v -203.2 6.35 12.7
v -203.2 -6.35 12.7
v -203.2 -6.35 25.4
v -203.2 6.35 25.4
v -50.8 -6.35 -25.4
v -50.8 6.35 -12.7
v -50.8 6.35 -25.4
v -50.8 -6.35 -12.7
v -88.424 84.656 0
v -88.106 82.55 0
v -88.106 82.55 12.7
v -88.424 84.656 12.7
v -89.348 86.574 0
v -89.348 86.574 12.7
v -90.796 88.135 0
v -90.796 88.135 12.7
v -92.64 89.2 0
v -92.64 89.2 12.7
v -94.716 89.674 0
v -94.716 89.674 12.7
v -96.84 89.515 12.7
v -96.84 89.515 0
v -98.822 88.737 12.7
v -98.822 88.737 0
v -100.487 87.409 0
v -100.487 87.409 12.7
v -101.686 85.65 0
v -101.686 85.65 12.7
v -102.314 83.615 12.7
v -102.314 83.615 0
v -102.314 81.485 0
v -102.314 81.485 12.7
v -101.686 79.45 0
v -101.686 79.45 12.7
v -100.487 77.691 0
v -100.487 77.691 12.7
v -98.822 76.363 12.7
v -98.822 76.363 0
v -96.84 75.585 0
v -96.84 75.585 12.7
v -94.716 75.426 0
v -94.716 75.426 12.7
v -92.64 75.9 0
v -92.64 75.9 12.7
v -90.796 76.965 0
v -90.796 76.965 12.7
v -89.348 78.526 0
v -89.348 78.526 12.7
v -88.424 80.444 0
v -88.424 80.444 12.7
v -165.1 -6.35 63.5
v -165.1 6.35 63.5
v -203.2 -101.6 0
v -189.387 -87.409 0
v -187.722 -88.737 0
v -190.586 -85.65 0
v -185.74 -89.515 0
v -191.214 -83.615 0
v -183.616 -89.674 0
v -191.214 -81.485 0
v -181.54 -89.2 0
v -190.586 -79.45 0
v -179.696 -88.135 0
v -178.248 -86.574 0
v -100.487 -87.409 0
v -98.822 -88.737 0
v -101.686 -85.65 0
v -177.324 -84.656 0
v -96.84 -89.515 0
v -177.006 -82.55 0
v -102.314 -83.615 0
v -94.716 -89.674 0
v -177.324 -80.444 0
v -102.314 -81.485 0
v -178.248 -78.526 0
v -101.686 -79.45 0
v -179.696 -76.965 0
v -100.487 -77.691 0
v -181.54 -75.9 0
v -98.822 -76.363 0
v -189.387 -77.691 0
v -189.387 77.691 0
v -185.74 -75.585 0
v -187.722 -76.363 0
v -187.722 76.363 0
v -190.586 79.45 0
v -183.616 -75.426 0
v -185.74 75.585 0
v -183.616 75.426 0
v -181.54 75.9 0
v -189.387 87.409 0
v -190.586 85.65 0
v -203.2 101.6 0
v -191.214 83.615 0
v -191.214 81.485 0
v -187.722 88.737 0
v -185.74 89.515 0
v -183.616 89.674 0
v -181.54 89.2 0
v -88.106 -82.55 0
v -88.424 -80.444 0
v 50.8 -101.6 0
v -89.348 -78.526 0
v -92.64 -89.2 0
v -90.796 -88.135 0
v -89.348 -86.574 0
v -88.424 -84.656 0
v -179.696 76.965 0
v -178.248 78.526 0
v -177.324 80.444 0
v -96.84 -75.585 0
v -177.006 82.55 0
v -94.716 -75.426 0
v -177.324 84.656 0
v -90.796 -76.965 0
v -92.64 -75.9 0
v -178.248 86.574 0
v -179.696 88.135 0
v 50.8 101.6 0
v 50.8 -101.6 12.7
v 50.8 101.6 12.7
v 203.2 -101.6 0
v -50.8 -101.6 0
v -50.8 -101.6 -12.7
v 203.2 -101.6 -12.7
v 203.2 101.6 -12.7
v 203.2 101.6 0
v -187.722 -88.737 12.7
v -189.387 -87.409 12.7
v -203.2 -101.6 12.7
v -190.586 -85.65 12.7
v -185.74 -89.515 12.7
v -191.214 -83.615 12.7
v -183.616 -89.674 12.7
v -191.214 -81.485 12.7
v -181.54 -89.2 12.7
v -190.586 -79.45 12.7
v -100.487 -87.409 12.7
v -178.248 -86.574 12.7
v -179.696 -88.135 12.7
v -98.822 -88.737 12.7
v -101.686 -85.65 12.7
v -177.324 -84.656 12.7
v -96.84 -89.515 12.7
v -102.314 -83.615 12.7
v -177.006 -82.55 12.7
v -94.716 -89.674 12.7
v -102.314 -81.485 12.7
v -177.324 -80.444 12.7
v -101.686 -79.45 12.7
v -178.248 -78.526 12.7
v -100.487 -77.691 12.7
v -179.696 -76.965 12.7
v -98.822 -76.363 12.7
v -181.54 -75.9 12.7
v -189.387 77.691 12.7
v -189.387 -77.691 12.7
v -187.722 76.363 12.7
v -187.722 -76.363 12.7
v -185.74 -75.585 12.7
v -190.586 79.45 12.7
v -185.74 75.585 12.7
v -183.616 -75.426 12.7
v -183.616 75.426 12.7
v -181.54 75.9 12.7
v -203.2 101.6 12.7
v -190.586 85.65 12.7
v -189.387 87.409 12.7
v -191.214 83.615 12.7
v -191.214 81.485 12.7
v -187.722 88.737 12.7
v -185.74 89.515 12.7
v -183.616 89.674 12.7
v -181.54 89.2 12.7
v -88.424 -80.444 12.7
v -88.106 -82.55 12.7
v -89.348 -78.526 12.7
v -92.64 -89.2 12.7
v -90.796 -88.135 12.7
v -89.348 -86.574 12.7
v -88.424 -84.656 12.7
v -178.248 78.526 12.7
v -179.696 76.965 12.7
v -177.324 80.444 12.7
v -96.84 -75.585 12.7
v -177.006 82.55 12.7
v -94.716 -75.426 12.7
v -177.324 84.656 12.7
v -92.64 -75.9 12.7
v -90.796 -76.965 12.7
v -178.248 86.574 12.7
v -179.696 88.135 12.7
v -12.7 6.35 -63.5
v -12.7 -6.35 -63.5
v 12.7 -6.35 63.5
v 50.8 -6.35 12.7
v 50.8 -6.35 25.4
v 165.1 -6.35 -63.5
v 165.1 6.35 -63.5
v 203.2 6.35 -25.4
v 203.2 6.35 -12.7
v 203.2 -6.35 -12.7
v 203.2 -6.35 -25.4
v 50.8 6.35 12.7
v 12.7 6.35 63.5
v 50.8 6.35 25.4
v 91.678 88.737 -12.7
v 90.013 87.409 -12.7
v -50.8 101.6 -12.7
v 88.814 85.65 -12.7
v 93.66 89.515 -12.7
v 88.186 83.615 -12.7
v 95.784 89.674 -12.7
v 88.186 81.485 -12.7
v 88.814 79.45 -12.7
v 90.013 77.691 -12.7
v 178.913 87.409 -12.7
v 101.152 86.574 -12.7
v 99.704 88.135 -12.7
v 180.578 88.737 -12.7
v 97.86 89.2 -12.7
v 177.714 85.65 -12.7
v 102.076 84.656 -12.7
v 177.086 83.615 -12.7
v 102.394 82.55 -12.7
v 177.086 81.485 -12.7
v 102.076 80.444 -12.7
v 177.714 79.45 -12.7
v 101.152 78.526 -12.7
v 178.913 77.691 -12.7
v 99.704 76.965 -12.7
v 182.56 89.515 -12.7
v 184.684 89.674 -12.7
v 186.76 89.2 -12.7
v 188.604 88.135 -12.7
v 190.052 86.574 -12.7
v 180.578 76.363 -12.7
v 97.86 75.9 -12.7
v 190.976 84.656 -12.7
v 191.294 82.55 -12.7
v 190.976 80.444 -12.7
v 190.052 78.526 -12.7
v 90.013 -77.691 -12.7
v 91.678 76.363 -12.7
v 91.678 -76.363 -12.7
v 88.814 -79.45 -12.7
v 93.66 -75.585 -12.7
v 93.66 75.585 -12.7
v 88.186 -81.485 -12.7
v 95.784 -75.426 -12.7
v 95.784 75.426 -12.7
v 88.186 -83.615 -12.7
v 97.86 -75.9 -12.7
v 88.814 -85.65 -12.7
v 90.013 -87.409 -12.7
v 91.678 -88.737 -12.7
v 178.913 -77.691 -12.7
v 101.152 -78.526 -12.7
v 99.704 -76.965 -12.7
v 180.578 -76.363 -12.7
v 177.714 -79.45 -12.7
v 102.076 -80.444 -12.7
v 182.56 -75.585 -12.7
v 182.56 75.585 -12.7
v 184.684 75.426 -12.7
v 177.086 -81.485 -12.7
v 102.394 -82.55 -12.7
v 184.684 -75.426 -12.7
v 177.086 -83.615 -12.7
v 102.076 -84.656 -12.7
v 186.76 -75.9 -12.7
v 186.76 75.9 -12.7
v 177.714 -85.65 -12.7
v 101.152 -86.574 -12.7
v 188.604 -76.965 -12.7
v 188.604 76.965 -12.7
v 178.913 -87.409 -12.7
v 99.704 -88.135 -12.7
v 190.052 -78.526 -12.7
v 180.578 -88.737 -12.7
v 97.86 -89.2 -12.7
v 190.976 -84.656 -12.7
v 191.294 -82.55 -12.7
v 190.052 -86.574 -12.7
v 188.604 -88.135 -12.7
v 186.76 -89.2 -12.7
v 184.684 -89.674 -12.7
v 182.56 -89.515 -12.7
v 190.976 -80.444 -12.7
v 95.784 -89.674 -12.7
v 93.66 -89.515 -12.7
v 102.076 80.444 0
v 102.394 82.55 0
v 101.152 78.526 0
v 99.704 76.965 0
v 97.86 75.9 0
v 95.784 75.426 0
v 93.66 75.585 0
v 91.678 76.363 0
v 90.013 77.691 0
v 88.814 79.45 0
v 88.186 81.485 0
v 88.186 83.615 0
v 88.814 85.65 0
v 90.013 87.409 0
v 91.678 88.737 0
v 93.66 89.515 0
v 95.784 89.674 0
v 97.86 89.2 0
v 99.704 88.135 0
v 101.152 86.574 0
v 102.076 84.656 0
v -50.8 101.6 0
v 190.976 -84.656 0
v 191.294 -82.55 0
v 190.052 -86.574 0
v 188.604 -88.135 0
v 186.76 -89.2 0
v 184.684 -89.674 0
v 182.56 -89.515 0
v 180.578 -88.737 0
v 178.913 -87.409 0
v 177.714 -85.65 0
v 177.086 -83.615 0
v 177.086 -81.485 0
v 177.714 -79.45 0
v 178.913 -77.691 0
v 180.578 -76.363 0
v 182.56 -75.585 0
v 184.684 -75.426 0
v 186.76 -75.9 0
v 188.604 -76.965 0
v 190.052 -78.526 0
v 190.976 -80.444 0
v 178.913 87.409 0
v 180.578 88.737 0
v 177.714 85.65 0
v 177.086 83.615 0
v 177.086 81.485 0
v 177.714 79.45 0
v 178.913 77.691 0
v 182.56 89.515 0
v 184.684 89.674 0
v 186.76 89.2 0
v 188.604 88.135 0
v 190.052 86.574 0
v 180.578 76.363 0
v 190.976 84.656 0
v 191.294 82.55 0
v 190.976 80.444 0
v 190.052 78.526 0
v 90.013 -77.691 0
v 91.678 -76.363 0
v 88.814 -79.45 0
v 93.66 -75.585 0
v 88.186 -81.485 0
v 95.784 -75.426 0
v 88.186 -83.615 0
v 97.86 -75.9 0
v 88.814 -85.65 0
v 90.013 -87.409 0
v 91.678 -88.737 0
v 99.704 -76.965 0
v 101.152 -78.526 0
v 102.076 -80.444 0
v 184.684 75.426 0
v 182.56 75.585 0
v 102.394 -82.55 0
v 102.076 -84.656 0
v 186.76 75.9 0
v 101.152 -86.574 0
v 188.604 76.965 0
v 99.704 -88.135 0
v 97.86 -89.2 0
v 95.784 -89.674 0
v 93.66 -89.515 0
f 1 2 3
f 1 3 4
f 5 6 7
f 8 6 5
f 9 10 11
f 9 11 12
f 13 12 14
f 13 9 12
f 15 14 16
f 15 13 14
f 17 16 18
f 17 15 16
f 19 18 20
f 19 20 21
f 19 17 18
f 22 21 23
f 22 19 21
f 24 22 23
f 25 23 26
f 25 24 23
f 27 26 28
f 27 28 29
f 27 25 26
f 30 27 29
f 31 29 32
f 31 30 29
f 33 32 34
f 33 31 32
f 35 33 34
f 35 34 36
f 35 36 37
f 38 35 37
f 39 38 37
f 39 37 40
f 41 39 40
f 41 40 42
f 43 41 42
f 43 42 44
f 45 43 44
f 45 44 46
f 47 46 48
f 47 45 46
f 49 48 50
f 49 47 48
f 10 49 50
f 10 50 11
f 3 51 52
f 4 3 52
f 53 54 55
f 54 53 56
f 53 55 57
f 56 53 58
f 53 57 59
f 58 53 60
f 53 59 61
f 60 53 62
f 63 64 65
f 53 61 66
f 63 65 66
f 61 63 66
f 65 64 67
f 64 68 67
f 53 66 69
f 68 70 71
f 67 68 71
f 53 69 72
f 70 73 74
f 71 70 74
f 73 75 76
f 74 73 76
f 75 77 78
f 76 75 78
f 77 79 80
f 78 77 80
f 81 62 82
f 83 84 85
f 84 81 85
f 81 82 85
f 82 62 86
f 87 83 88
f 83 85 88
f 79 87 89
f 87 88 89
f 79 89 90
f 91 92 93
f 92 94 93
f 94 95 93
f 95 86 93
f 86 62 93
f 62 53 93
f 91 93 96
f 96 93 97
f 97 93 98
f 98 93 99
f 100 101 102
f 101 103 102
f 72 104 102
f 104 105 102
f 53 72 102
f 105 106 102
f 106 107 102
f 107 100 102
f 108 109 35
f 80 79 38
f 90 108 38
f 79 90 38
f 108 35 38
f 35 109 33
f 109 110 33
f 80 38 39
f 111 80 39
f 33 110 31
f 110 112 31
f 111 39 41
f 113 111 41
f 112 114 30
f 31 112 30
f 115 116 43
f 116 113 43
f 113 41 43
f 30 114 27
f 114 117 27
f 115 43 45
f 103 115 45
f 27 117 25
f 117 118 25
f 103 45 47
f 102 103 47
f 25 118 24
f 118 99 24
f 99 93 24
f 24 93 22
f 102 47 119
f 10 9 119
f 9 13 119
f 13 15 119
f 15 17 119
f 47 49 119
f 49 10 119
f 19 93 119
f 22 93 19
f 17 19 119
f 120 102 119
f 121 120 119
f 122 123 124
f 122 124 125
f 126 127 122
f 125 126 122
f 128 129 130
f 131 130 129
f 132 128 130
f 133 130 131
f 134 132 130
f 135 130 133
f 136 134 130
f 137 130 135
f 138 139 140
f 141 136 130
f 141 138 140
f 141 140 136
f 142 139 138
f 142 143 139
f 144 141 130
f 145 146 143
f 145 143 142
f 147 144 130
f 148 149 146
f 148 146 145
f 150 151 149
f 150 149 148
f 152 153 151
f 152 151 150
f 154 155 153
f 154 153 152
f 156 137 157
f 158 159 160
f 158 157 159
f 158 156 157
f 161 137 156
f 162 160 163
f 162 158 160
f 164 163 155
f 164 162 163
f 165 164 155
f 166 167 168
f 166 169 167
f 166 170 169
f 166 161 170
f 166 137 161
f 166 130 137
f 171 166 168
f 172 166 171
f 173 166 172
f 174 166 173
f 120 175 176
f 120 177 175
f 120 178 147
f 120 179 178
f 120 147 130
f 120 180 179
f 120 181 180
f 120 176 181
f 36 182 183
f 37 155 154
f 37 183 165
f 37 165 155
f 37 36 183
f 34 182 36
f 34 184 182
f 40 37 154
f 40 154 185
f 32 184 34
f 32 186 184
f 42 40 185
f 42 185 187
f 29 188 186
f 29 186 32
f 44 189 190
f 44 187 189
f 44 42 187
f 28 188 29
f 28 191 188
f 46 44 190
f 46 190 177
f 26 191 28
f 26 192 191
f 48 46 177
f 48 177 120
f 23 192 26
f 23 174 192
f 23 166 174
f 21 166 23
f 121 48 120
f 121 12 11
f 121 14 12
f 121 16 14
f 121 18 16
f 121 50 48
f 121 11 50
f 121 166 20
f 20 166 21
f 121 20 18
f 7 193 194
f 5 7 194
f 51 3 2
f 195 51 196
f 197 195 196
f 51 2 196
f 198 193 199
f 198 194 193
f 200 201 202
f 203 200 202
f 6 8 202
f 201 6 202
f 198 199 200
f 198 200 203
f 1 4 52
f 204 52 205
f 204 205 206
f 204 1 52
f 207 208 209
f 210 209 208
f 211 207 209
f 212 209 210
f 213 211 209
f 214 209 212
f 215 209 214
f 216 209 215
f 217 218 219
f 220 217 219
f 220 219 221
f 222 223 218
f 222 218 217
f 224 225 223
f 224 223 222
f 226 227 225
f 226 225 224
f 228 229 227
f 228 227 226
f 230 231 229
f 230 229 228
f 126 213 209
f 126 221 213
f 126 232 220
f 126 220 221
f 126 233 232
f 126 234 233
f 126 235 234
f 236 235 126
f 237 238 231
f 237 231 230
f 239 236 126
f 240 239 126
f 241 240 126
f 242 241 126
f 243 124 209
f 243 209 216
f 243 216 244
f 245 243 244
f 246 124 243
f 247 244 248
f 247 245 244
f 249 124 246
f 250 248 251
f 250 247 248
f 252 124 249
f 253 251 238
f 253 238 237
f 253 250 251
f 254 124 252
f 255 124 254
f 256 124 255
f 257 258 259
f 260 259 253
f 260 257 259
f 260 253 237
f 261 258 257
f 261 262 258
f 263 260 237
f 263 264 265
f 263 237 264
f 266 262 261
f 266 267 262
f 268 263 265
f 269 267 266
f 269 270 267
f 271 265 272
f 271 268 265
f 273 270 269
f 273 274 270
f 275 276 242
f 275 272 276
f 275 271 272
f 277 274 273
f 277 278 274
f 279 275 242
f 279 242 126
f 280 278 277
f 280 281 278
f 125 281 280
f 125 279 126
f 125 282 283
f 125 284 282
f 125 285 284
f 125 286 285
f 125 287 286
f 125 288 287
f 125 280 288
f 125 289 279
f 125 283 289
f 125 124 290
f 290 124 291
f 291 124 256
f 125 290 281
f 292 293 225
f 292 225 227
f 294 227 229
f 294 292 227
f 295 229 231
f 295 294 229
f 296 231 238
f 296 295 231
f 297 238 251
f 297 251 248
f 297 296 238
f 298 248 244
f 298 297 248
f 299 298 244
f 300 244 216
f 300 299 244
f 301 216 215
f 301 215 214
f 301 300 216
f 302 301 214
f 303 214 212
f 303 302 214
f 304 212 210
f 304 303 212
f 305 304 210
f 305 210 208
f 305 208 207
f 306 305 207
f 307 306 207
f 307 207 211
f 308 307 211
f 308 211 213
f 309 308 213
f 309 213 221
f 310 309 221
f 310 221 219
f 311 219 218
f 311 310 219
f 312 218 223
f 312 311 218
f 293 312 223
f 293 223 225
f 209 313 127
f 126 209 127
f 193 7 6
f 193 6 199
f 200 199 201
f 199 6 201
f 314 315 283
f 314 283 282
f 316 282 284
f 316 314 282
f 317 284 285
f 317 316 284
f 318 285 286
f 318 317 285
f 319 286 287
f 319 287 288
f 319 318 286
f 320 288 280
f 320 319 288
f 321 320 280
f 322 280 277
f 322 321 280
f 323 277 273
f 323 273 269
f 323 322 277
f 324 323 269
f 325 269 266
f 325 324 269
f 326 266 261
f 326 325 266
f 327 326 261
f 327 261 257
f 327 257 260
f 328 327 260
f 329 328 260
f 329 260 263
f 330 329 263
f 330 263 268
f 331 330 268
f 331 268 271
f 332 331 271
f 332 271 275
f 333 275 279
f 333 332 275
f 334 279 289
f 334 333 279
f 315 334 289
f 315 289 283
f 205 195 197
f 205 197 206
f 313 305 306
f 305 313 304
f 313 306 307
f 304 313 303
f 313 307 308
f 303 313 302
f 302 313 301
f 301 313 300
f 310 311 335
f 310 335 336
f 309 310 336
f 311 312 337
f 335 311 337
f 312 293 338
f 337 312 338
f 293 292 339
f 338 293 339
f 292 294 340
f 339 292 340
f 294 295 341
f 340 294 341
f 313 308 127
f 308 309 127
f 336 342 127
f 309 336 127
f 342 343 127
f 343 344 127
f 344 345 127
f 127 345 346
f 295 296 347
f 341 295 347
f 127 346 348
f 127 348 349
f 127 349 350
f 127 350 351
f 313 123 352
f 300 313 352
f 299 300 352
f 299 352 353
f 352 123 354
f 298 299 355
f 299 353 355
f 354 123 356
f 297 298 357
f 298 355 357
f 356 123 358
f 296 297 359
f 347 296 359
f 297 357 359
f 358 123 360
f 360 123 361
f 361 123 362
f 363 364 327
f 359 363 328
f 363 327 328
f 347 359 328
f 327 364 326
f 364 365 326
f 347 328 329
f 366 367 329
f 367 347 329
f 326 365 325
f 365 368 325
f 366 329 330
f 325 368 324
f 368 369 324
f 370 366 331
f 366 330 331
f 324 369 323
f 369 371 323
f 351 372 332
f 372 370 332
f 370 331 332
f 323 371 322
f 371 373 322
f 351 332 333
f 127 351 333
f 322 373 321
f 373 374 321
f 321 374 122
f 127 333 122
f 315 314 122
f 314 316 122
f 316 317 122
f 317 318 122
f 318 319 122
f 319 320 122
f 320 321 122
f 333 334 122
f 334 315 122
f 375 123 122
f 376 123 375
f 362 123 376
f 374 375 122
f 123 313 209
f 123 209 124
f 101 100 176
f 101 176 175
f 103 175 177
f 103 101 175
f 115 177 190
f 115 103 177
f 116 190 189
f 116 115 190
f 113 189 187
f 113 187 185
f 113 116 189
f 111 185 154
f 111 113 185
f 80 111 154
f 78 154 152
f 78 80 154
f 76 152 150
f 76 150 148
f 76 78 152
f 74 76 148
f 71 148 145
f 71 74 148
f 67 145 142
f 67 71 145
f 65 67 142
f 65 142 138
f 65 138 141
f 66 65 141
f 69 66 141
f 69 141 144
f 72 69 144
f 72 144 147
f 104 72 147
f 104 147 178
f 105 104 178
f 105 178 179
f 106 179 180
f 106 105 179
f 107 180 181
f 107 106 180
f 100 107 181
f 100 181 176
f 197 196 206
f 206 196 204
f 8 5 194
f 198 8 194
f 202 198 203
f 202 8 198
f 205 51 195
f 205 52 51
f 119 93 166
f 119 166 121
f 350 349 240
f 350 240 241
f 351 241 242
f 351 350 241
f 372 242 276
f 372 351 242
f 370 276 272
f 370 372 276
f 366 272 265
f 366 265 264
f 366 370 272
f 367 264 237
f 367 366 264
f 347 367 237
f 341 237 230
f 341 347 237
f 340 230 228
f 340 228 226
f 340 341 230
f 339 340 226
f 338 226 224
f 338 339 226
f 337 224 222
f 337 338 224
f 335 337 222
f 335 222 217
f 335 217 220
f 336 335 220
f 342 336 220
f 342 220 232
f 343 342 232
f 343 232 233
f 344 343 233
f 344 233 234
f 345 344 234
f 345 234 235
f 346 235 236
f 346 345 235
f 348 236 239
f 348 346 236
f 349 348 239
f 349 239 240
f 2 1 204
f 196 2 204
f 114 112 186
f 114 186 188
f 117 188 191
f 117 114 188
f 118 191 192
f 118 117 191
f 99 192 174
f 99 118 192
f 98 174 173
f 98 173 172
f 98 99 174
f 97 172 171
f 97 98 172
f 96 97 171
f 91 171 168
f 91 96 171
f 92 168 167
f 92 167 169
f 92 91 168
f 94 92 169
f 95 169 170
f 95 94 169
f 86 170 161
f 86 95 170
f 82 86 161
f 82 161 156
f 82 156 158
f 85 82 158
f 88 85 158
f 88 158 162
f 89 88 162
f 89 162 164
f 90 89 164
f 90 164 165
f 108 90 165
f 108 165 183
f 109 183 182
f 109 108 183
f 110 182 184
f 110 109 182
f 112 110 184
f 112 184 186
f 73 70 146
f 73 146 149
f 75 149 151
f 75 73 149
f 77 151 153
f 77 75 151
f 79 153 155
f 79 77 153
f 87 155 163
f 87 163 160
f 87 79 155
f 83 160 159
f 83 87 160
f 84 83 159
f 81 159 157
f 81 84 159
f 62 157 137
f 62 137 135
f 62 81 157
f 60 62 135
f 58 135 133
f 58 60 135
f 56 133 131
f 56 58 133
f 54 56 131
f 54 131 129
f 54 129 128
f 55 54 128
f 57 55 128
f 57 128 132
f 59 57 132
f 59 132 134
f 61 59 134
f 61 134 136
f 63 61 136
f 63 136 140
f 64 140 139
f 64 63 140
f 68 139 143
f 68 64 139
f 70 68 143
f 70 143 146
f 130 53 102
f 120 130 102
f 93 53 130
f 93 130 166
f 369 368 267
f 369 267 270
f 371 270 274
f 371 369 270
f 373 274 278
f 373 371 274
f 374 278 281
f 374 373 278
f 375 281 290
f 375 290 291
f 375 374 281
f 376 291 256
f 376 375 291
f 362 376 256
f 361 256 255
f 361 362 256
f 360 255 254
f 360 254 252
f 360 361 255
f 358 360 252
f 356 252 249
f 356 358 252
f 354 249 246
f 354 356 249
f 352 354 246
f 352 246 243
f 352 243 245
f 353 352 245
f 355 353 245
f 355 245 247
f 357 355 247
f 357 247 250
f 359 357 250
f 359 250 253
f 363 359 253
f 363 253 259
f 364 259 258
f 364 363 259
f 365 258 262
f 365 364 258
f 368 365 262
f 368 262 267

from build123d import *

# Parameters (mm, degrees)
F0_W     = 254
F0_H     = 203.2
F0_R     = 7.14375
F1_DEPTH = 12.7
F2_W     = 254
F2_H     = 203.2
F2_R     = 7.14375
F3_DEPTH = 12.7
F4_W     = 254
F4_H     = 12.7
F5_DEPTH = 50.8
F6_SIZE  = 38.1
F7_W     = 254
F7_H     = 12.7
F8_DEPTH = 50.8
F9_SIZE  = 38.1


with BuildPart() as f1:
    # F0 (on Top) → F1 (new body)
    with BuildSketch(Plane.XY):
        with Locations((-76.2, 0)):
            Rectangle(F0_W, F0_H)
        with Locations((-184.15, -82.55)):
            Circle(F0_R, mode=Mode.SUBTRACT)
        with Locations((-95.25, -82.55)):
            Circle(F0_R, mode=Mode.SUBTRACT)
        with Locations((-184.15, 82.55)):
            Circle(F0_R, mode=Mode.SUBTRACT)
        with Locations((-95.25, 82.55)):
            Circle(F0_R, mode=Mode.SUBTRACT)
    extrude(amount=F1_DEPTH)


with BuildPart() as f3:
    # F2 (on face) → F3 (new body)
    with BuildSketch(Plane(origin=(0, 0, 0), x_dir=(1, 0, 0), z_dir=(0, 0, -1))):
        with Locations((76.2, 0)):
            Rectangle(F2_W, F2_H)
        with Locations((95.25, -82.55)):
            Circle(F2_R, mode=Mode.SUBTRACT)
        with Locations((184.15, -82.55)):
            Circle(F2_R, mode=Mode.SUBTRACT)
        with Locations((95.25, 82.55)):
            Circle(F2_R, mode=Mode.SUBTRACT)
        with Locations((184.15, 82.55)):
            Circle(F2_R, mode=Mode.SUBTRACT)
    extrude(amount=F3_DEPTH)


with BuildPart() as f5:
    # F4 (on face) → F5 (new body)
    with BuildSketch(Plane.XY.offset(12.7)):
        with Locations((-76.2, 0)):
            Rectangle(F4_W, F4_H)
    extrude(amount=F5_DEPTH)

    # F6
    f6_edges = [f5.edges().sort_by_distance(p)[0] for p in [
        (-203.2, 0, 63.5),
        (50.8, 0, 63.5),
    ]]
    chamfer(f6_edges, length=F6_SIZE)


with BuildPart() as f8:
    # F7 (on face) → F8 (new body)
    with BuildSketch(Plane(origin=(0, 0, -12.7), x_dir=(1, 0, 0), z_dir=(0, 0, -1))):
        with Locations((76.2, 0)):
            Rectangle(F7_W, F7_H)
    extrude(amount=F8_DEPTH)

    # F9
    f9_edges = [f8.edges().sort_by_distance(p)[0] for p in [
        (203.2, 0, -63.5),
        (-50.8, 0, -63.5),
    ]]
    chamfer(f9_edges, length=F9_SIZE)


solid = Compound([f1.part, f3.part, f5.part, f8.part])
